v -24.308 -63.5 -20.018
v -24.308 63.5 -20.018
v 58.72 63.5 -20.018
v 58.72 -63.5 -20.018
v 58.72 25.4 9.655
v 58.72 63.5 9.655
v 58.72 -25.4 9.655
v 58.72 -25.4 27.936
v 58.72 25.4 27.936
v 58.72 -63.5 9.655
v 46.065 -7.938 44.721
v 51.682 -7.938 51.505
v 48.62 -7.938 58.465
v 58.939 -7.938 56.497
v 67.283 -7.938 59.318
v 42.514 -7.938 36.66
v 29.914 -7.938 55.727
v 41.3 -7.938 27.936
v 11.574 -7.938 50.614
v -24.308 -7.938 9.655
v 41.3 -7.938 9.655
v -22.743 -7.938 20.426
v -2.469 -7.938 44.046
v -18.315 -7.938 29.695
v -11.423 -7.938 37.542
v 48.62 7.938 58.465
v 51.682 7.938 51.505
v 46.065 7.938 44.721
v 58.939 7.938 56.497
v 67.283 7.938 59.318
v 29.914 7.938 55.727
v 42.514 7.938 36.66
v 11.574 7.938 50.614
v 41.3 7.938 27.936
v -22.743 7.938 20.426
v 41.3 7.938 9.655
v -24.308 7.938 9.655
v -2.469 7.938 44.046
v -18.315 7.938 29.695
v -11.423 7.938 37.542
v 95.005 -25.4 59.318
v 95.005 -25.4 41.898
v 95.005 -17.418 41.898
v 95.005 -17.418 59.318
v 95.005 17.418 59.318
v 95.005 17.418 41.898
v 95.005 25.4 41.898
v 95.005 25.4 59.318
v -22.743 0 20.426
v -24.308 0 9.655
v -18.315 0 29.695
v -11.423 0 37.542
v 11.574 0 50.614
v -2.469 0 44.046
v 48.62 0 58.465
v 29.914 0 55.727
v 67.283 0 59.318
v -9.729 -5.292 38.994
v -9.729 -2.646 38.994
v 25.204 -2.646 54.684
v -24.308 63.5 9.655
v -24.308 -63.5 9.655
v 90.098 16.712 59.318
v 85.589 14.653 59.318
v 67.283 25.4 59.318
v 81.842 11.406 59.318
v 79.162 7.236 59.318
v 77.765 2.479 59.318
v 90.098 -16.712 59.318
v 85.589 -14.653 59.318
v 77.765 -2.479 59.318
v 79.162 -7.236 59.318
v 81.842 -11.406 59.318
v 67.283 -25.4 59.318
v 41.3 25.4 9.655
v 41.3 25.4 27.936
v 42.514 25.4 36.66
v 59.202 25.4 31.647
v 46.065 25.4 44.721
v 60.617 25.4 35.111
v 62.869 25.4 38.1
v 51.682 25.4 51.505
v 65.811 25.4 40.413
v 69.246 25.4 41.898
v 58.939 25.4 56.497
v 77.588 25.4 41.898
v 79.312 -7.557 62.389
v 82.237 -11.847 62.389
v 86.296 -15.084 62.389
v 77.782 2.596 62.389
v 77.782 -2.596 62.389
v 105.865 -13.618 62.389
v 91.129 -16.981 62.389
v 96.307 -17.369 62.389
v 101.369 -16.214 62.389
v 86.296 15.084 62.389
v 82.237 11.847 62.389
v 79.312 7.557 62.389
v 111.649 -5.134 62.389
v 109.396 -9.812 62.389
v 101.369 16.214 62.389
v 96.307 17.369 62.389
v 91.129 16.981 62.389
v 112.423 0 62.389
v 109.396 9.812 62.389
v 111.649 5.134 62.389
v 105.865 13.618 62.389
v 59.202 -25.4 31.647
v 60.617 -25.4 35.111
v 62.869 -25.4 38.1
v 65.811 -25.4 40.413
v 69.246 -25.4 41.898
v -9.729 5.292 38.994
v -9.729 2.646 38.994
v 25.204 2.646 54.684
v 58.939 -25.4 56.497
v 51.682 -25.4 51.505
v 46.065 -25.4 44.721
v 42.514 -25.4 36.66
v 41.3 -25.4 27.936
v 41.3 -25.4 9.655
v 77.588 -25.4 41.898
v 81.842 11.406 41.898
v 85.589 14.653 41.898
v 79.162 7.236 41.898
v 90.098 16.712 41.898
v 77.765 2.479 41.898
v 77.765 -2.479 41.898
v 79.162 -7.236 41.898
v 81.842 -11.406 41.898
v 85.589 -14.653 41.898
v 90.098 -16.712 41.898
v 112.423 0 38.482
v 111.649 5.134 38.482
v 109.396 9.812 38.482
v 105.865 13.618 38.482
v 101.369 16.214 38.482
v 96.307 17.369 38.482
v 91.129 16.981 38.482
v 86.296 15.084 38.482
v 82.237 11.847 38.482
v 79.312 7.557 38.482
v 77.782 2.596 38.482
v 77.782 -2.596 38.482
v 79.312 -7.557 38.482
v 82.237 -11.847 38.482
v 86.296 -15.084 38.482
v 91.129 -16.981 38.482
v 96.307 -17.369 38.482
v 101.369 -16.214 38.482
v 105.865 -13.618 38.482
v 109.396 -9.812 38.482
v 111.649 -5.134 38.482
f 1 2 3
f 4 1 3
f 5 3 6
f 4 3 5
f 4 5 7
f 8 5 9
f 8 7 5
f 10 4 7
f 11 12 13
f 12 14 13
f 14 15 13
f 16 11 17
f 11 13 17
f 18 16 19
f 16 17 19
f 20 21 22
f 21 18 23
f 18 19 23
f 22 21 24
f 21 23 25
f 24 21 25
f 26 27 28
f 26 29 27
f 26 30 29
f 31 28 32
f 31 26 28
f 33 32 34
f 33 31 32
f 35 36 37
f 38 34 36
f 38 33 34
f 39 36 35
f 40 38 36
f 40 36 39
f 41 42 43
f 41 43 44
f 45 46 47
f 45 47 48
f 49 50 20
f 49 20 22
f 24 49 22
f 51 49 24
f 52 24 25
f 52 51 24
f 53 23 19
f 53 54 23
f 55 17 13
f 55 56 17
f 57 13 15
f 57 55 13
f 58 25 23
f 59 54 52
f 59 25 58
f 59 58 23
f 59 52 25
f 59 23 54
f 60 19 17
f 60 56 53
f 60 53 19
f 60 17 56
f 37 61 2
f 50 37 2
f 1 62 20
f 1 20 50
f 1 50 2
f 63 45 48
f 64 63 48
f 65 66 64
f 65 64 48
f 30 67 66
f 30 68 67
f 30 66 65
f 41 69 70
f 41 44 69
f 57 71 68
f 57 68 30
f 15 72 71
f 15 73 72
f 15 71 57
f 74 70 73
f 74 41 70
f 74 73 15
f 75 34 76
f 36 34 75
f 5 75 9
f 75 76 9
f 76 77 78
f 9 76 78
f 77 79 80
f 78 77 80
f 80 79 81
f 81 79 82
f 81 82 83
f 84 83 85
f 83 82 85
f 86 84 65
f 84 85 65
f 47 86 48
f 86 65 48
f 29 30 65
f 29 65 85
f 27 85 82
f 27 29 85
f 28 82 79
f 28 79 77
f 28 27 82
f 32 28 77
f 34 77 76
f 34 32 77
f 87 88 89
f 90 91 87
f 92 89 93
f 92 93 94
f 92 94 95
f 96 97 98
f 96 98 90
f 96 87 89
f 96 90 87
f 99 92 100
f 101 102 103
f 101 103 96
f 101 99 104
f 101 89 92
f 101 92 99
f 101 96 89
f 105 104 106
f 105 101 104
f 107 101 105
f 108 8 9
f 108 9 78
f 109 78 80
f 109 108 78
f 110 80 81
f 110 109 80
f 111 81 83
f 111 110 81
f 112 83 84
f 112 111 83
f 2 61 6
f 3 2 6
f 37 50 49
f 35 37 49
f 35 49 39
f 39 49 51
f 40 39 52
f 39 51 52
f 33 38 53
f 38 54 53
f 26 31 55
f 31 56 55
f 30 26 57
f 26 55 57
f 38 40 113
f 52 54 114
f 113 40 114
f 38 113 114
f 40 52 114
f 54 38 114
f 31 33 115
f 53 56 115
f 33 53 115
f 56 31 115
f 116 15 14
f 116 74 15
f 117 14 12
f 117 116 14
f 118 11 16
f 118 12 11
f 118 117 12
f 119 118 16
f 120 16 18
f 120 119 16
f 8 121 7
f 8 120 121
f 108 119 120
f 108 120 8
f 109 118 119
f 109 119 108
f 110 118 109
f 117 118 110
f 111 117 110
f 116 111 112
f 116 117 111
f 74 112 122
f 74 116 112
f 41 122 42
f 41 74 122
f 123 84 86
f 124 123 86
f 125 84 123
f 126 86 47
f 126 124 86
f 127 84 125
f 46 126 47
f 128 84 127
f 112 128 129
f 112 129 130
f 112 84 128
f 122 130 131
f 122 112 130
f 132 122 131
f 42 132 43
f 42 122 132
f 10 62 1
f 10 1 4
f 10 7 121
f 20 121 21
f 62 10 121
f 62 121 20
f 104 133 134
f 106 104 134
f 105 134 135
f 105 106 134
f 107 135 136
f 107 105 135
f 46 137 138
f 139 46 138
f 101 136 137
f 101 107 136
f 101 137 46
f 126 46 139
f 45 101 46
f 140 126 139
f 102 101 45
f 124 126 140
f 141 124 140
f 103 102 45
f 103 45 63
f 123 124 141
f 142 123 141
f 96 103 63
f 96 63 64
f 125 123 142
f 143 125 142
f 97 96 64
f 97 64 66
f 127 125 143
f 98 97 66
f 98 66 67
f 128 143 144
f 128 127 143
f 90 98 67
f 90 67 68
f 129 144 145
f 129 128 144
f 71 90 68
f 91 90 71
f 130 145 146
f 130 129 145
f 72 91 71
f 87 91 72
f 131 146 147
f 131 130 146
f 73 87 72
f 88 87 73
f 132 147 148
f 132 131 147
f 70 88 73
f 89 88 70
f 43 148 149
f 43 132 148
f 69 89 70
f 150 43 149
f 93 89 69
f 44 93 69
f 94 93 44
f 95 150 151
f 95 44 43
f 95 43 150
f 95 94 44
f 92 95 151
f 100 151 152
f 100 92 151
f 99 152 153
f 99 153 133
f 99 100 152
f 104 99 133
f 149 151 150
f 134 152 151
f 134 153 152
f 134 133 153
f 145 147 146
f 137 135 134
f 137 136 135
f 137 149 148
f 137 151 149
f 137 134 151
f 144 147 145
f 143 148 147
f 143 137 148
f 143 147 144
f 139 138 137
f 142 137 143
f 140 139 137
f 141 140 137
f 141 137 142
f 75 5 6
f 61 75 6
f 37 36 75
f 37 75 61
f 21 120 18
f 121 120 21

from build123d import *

# Parameters (mm, degrees)
F1_DEPTH = 63.5
F0_W     = 17.417691648
F0_H     = 17.4204483628
F2_DEPTH = 25.4
F3_DEPTH = 7.9375


with BuildPart() as f1:
    # F0 (on Front) → F1 (new body, symmetric)
    with BuildSketch(Plane.XZ):
        Polygon((-24.308366701, 9.6553536132), (-24.308366701, -20.018171519), (58.7199889123, -20.018171519), (58.7199889123, 9.6553536132), (41.2995405495, 9.6553536132), align=None)
    extrude(amount=F1_DEPTH, both=True)

    # F0 (on Front) → F2 (join, symmetric)
    with BuildSketch(Plane.XZ):
        with BuildLine():
            Line((41.2995405495, 9.6553536132), (58.7199889123, 9.6553536132))
            Line((58.7199889123, 9.6553536132), (58.7199889123, 27.9359869646))
            ThreePointArc((58.7199889123, 27.9359869646), (61.6462339418, 36.6784025907), (69.2457072501, 41.8976694345))
            Line((69.2457072501, 41.8976694345), (77.5875747204, 41.8976694345))
            Line((77.5875747204, 41.8976694345), (77.5875747204, 59.3181177974))
            Line((77.5875747204, 59.3181177974), (67.2831763104, 59.3181177974))
            ThreePointArc((67.2831763104, 59.3181177974), (48.6385264432, 48.3074588245), (41.2995405495, 27.9359869646))
            Line((41.2995405495, 27.9359869646), (41.2995405495, 9.6553536132))
        make_face()
        with Locations((86.2964205444, 50.607893616)):
            Rectangle(F0_W, F0_H)
    extrude(amount=F2_DEPTH, both=True)

    # F0 (on Front) → F3 (join, symmetric)
    with BuildSketch(Plane.XZ):
        with BuildLine():
            add(Edge.make_bspline(
                [(-24.308366701, 9.6553536132), (-24.308366701, 46.6815978289), (26.0343328118, 59.3484714627), (67.2831763104, 59.3181177974)],
                knots=[0, 0, 0, 0, 104.1892551928, 104.1892551928, 104.1892551928, 104.1892551928], degree=3))
            Line((-24.308366701, 9.6553536132), (41.2995405495, 9.6553536132))
            Line((41.2995405495, 9.6553536132), (41.2995405495, 27.9359869646))
            ThreePointArc((41.2995405495, 27.9359869646), (48.6385264432, 48.3074588245), (67.2831763104, 59.3181177974))
        make_face()
    extrude(amount=F3_DEPTH, both=True)

    # F0 (on Front) → F4 (revolve)
    with BuildSketch(Plane.XZ):
        Polygon((95.0052663684, 62.3890832067), (95.0052663684, 59.3181177974), (95.0052663684, 41.8976694345), (95.0052663684, 38.4824350476), (112.4229580164, 38.4824350476), (112.4229580164, 62.3890832067), align=None)
    revolve(axis=Axis((95.0052663684, 0, 50.4357591271), (0, 0, 1)))


solid = f1.part
